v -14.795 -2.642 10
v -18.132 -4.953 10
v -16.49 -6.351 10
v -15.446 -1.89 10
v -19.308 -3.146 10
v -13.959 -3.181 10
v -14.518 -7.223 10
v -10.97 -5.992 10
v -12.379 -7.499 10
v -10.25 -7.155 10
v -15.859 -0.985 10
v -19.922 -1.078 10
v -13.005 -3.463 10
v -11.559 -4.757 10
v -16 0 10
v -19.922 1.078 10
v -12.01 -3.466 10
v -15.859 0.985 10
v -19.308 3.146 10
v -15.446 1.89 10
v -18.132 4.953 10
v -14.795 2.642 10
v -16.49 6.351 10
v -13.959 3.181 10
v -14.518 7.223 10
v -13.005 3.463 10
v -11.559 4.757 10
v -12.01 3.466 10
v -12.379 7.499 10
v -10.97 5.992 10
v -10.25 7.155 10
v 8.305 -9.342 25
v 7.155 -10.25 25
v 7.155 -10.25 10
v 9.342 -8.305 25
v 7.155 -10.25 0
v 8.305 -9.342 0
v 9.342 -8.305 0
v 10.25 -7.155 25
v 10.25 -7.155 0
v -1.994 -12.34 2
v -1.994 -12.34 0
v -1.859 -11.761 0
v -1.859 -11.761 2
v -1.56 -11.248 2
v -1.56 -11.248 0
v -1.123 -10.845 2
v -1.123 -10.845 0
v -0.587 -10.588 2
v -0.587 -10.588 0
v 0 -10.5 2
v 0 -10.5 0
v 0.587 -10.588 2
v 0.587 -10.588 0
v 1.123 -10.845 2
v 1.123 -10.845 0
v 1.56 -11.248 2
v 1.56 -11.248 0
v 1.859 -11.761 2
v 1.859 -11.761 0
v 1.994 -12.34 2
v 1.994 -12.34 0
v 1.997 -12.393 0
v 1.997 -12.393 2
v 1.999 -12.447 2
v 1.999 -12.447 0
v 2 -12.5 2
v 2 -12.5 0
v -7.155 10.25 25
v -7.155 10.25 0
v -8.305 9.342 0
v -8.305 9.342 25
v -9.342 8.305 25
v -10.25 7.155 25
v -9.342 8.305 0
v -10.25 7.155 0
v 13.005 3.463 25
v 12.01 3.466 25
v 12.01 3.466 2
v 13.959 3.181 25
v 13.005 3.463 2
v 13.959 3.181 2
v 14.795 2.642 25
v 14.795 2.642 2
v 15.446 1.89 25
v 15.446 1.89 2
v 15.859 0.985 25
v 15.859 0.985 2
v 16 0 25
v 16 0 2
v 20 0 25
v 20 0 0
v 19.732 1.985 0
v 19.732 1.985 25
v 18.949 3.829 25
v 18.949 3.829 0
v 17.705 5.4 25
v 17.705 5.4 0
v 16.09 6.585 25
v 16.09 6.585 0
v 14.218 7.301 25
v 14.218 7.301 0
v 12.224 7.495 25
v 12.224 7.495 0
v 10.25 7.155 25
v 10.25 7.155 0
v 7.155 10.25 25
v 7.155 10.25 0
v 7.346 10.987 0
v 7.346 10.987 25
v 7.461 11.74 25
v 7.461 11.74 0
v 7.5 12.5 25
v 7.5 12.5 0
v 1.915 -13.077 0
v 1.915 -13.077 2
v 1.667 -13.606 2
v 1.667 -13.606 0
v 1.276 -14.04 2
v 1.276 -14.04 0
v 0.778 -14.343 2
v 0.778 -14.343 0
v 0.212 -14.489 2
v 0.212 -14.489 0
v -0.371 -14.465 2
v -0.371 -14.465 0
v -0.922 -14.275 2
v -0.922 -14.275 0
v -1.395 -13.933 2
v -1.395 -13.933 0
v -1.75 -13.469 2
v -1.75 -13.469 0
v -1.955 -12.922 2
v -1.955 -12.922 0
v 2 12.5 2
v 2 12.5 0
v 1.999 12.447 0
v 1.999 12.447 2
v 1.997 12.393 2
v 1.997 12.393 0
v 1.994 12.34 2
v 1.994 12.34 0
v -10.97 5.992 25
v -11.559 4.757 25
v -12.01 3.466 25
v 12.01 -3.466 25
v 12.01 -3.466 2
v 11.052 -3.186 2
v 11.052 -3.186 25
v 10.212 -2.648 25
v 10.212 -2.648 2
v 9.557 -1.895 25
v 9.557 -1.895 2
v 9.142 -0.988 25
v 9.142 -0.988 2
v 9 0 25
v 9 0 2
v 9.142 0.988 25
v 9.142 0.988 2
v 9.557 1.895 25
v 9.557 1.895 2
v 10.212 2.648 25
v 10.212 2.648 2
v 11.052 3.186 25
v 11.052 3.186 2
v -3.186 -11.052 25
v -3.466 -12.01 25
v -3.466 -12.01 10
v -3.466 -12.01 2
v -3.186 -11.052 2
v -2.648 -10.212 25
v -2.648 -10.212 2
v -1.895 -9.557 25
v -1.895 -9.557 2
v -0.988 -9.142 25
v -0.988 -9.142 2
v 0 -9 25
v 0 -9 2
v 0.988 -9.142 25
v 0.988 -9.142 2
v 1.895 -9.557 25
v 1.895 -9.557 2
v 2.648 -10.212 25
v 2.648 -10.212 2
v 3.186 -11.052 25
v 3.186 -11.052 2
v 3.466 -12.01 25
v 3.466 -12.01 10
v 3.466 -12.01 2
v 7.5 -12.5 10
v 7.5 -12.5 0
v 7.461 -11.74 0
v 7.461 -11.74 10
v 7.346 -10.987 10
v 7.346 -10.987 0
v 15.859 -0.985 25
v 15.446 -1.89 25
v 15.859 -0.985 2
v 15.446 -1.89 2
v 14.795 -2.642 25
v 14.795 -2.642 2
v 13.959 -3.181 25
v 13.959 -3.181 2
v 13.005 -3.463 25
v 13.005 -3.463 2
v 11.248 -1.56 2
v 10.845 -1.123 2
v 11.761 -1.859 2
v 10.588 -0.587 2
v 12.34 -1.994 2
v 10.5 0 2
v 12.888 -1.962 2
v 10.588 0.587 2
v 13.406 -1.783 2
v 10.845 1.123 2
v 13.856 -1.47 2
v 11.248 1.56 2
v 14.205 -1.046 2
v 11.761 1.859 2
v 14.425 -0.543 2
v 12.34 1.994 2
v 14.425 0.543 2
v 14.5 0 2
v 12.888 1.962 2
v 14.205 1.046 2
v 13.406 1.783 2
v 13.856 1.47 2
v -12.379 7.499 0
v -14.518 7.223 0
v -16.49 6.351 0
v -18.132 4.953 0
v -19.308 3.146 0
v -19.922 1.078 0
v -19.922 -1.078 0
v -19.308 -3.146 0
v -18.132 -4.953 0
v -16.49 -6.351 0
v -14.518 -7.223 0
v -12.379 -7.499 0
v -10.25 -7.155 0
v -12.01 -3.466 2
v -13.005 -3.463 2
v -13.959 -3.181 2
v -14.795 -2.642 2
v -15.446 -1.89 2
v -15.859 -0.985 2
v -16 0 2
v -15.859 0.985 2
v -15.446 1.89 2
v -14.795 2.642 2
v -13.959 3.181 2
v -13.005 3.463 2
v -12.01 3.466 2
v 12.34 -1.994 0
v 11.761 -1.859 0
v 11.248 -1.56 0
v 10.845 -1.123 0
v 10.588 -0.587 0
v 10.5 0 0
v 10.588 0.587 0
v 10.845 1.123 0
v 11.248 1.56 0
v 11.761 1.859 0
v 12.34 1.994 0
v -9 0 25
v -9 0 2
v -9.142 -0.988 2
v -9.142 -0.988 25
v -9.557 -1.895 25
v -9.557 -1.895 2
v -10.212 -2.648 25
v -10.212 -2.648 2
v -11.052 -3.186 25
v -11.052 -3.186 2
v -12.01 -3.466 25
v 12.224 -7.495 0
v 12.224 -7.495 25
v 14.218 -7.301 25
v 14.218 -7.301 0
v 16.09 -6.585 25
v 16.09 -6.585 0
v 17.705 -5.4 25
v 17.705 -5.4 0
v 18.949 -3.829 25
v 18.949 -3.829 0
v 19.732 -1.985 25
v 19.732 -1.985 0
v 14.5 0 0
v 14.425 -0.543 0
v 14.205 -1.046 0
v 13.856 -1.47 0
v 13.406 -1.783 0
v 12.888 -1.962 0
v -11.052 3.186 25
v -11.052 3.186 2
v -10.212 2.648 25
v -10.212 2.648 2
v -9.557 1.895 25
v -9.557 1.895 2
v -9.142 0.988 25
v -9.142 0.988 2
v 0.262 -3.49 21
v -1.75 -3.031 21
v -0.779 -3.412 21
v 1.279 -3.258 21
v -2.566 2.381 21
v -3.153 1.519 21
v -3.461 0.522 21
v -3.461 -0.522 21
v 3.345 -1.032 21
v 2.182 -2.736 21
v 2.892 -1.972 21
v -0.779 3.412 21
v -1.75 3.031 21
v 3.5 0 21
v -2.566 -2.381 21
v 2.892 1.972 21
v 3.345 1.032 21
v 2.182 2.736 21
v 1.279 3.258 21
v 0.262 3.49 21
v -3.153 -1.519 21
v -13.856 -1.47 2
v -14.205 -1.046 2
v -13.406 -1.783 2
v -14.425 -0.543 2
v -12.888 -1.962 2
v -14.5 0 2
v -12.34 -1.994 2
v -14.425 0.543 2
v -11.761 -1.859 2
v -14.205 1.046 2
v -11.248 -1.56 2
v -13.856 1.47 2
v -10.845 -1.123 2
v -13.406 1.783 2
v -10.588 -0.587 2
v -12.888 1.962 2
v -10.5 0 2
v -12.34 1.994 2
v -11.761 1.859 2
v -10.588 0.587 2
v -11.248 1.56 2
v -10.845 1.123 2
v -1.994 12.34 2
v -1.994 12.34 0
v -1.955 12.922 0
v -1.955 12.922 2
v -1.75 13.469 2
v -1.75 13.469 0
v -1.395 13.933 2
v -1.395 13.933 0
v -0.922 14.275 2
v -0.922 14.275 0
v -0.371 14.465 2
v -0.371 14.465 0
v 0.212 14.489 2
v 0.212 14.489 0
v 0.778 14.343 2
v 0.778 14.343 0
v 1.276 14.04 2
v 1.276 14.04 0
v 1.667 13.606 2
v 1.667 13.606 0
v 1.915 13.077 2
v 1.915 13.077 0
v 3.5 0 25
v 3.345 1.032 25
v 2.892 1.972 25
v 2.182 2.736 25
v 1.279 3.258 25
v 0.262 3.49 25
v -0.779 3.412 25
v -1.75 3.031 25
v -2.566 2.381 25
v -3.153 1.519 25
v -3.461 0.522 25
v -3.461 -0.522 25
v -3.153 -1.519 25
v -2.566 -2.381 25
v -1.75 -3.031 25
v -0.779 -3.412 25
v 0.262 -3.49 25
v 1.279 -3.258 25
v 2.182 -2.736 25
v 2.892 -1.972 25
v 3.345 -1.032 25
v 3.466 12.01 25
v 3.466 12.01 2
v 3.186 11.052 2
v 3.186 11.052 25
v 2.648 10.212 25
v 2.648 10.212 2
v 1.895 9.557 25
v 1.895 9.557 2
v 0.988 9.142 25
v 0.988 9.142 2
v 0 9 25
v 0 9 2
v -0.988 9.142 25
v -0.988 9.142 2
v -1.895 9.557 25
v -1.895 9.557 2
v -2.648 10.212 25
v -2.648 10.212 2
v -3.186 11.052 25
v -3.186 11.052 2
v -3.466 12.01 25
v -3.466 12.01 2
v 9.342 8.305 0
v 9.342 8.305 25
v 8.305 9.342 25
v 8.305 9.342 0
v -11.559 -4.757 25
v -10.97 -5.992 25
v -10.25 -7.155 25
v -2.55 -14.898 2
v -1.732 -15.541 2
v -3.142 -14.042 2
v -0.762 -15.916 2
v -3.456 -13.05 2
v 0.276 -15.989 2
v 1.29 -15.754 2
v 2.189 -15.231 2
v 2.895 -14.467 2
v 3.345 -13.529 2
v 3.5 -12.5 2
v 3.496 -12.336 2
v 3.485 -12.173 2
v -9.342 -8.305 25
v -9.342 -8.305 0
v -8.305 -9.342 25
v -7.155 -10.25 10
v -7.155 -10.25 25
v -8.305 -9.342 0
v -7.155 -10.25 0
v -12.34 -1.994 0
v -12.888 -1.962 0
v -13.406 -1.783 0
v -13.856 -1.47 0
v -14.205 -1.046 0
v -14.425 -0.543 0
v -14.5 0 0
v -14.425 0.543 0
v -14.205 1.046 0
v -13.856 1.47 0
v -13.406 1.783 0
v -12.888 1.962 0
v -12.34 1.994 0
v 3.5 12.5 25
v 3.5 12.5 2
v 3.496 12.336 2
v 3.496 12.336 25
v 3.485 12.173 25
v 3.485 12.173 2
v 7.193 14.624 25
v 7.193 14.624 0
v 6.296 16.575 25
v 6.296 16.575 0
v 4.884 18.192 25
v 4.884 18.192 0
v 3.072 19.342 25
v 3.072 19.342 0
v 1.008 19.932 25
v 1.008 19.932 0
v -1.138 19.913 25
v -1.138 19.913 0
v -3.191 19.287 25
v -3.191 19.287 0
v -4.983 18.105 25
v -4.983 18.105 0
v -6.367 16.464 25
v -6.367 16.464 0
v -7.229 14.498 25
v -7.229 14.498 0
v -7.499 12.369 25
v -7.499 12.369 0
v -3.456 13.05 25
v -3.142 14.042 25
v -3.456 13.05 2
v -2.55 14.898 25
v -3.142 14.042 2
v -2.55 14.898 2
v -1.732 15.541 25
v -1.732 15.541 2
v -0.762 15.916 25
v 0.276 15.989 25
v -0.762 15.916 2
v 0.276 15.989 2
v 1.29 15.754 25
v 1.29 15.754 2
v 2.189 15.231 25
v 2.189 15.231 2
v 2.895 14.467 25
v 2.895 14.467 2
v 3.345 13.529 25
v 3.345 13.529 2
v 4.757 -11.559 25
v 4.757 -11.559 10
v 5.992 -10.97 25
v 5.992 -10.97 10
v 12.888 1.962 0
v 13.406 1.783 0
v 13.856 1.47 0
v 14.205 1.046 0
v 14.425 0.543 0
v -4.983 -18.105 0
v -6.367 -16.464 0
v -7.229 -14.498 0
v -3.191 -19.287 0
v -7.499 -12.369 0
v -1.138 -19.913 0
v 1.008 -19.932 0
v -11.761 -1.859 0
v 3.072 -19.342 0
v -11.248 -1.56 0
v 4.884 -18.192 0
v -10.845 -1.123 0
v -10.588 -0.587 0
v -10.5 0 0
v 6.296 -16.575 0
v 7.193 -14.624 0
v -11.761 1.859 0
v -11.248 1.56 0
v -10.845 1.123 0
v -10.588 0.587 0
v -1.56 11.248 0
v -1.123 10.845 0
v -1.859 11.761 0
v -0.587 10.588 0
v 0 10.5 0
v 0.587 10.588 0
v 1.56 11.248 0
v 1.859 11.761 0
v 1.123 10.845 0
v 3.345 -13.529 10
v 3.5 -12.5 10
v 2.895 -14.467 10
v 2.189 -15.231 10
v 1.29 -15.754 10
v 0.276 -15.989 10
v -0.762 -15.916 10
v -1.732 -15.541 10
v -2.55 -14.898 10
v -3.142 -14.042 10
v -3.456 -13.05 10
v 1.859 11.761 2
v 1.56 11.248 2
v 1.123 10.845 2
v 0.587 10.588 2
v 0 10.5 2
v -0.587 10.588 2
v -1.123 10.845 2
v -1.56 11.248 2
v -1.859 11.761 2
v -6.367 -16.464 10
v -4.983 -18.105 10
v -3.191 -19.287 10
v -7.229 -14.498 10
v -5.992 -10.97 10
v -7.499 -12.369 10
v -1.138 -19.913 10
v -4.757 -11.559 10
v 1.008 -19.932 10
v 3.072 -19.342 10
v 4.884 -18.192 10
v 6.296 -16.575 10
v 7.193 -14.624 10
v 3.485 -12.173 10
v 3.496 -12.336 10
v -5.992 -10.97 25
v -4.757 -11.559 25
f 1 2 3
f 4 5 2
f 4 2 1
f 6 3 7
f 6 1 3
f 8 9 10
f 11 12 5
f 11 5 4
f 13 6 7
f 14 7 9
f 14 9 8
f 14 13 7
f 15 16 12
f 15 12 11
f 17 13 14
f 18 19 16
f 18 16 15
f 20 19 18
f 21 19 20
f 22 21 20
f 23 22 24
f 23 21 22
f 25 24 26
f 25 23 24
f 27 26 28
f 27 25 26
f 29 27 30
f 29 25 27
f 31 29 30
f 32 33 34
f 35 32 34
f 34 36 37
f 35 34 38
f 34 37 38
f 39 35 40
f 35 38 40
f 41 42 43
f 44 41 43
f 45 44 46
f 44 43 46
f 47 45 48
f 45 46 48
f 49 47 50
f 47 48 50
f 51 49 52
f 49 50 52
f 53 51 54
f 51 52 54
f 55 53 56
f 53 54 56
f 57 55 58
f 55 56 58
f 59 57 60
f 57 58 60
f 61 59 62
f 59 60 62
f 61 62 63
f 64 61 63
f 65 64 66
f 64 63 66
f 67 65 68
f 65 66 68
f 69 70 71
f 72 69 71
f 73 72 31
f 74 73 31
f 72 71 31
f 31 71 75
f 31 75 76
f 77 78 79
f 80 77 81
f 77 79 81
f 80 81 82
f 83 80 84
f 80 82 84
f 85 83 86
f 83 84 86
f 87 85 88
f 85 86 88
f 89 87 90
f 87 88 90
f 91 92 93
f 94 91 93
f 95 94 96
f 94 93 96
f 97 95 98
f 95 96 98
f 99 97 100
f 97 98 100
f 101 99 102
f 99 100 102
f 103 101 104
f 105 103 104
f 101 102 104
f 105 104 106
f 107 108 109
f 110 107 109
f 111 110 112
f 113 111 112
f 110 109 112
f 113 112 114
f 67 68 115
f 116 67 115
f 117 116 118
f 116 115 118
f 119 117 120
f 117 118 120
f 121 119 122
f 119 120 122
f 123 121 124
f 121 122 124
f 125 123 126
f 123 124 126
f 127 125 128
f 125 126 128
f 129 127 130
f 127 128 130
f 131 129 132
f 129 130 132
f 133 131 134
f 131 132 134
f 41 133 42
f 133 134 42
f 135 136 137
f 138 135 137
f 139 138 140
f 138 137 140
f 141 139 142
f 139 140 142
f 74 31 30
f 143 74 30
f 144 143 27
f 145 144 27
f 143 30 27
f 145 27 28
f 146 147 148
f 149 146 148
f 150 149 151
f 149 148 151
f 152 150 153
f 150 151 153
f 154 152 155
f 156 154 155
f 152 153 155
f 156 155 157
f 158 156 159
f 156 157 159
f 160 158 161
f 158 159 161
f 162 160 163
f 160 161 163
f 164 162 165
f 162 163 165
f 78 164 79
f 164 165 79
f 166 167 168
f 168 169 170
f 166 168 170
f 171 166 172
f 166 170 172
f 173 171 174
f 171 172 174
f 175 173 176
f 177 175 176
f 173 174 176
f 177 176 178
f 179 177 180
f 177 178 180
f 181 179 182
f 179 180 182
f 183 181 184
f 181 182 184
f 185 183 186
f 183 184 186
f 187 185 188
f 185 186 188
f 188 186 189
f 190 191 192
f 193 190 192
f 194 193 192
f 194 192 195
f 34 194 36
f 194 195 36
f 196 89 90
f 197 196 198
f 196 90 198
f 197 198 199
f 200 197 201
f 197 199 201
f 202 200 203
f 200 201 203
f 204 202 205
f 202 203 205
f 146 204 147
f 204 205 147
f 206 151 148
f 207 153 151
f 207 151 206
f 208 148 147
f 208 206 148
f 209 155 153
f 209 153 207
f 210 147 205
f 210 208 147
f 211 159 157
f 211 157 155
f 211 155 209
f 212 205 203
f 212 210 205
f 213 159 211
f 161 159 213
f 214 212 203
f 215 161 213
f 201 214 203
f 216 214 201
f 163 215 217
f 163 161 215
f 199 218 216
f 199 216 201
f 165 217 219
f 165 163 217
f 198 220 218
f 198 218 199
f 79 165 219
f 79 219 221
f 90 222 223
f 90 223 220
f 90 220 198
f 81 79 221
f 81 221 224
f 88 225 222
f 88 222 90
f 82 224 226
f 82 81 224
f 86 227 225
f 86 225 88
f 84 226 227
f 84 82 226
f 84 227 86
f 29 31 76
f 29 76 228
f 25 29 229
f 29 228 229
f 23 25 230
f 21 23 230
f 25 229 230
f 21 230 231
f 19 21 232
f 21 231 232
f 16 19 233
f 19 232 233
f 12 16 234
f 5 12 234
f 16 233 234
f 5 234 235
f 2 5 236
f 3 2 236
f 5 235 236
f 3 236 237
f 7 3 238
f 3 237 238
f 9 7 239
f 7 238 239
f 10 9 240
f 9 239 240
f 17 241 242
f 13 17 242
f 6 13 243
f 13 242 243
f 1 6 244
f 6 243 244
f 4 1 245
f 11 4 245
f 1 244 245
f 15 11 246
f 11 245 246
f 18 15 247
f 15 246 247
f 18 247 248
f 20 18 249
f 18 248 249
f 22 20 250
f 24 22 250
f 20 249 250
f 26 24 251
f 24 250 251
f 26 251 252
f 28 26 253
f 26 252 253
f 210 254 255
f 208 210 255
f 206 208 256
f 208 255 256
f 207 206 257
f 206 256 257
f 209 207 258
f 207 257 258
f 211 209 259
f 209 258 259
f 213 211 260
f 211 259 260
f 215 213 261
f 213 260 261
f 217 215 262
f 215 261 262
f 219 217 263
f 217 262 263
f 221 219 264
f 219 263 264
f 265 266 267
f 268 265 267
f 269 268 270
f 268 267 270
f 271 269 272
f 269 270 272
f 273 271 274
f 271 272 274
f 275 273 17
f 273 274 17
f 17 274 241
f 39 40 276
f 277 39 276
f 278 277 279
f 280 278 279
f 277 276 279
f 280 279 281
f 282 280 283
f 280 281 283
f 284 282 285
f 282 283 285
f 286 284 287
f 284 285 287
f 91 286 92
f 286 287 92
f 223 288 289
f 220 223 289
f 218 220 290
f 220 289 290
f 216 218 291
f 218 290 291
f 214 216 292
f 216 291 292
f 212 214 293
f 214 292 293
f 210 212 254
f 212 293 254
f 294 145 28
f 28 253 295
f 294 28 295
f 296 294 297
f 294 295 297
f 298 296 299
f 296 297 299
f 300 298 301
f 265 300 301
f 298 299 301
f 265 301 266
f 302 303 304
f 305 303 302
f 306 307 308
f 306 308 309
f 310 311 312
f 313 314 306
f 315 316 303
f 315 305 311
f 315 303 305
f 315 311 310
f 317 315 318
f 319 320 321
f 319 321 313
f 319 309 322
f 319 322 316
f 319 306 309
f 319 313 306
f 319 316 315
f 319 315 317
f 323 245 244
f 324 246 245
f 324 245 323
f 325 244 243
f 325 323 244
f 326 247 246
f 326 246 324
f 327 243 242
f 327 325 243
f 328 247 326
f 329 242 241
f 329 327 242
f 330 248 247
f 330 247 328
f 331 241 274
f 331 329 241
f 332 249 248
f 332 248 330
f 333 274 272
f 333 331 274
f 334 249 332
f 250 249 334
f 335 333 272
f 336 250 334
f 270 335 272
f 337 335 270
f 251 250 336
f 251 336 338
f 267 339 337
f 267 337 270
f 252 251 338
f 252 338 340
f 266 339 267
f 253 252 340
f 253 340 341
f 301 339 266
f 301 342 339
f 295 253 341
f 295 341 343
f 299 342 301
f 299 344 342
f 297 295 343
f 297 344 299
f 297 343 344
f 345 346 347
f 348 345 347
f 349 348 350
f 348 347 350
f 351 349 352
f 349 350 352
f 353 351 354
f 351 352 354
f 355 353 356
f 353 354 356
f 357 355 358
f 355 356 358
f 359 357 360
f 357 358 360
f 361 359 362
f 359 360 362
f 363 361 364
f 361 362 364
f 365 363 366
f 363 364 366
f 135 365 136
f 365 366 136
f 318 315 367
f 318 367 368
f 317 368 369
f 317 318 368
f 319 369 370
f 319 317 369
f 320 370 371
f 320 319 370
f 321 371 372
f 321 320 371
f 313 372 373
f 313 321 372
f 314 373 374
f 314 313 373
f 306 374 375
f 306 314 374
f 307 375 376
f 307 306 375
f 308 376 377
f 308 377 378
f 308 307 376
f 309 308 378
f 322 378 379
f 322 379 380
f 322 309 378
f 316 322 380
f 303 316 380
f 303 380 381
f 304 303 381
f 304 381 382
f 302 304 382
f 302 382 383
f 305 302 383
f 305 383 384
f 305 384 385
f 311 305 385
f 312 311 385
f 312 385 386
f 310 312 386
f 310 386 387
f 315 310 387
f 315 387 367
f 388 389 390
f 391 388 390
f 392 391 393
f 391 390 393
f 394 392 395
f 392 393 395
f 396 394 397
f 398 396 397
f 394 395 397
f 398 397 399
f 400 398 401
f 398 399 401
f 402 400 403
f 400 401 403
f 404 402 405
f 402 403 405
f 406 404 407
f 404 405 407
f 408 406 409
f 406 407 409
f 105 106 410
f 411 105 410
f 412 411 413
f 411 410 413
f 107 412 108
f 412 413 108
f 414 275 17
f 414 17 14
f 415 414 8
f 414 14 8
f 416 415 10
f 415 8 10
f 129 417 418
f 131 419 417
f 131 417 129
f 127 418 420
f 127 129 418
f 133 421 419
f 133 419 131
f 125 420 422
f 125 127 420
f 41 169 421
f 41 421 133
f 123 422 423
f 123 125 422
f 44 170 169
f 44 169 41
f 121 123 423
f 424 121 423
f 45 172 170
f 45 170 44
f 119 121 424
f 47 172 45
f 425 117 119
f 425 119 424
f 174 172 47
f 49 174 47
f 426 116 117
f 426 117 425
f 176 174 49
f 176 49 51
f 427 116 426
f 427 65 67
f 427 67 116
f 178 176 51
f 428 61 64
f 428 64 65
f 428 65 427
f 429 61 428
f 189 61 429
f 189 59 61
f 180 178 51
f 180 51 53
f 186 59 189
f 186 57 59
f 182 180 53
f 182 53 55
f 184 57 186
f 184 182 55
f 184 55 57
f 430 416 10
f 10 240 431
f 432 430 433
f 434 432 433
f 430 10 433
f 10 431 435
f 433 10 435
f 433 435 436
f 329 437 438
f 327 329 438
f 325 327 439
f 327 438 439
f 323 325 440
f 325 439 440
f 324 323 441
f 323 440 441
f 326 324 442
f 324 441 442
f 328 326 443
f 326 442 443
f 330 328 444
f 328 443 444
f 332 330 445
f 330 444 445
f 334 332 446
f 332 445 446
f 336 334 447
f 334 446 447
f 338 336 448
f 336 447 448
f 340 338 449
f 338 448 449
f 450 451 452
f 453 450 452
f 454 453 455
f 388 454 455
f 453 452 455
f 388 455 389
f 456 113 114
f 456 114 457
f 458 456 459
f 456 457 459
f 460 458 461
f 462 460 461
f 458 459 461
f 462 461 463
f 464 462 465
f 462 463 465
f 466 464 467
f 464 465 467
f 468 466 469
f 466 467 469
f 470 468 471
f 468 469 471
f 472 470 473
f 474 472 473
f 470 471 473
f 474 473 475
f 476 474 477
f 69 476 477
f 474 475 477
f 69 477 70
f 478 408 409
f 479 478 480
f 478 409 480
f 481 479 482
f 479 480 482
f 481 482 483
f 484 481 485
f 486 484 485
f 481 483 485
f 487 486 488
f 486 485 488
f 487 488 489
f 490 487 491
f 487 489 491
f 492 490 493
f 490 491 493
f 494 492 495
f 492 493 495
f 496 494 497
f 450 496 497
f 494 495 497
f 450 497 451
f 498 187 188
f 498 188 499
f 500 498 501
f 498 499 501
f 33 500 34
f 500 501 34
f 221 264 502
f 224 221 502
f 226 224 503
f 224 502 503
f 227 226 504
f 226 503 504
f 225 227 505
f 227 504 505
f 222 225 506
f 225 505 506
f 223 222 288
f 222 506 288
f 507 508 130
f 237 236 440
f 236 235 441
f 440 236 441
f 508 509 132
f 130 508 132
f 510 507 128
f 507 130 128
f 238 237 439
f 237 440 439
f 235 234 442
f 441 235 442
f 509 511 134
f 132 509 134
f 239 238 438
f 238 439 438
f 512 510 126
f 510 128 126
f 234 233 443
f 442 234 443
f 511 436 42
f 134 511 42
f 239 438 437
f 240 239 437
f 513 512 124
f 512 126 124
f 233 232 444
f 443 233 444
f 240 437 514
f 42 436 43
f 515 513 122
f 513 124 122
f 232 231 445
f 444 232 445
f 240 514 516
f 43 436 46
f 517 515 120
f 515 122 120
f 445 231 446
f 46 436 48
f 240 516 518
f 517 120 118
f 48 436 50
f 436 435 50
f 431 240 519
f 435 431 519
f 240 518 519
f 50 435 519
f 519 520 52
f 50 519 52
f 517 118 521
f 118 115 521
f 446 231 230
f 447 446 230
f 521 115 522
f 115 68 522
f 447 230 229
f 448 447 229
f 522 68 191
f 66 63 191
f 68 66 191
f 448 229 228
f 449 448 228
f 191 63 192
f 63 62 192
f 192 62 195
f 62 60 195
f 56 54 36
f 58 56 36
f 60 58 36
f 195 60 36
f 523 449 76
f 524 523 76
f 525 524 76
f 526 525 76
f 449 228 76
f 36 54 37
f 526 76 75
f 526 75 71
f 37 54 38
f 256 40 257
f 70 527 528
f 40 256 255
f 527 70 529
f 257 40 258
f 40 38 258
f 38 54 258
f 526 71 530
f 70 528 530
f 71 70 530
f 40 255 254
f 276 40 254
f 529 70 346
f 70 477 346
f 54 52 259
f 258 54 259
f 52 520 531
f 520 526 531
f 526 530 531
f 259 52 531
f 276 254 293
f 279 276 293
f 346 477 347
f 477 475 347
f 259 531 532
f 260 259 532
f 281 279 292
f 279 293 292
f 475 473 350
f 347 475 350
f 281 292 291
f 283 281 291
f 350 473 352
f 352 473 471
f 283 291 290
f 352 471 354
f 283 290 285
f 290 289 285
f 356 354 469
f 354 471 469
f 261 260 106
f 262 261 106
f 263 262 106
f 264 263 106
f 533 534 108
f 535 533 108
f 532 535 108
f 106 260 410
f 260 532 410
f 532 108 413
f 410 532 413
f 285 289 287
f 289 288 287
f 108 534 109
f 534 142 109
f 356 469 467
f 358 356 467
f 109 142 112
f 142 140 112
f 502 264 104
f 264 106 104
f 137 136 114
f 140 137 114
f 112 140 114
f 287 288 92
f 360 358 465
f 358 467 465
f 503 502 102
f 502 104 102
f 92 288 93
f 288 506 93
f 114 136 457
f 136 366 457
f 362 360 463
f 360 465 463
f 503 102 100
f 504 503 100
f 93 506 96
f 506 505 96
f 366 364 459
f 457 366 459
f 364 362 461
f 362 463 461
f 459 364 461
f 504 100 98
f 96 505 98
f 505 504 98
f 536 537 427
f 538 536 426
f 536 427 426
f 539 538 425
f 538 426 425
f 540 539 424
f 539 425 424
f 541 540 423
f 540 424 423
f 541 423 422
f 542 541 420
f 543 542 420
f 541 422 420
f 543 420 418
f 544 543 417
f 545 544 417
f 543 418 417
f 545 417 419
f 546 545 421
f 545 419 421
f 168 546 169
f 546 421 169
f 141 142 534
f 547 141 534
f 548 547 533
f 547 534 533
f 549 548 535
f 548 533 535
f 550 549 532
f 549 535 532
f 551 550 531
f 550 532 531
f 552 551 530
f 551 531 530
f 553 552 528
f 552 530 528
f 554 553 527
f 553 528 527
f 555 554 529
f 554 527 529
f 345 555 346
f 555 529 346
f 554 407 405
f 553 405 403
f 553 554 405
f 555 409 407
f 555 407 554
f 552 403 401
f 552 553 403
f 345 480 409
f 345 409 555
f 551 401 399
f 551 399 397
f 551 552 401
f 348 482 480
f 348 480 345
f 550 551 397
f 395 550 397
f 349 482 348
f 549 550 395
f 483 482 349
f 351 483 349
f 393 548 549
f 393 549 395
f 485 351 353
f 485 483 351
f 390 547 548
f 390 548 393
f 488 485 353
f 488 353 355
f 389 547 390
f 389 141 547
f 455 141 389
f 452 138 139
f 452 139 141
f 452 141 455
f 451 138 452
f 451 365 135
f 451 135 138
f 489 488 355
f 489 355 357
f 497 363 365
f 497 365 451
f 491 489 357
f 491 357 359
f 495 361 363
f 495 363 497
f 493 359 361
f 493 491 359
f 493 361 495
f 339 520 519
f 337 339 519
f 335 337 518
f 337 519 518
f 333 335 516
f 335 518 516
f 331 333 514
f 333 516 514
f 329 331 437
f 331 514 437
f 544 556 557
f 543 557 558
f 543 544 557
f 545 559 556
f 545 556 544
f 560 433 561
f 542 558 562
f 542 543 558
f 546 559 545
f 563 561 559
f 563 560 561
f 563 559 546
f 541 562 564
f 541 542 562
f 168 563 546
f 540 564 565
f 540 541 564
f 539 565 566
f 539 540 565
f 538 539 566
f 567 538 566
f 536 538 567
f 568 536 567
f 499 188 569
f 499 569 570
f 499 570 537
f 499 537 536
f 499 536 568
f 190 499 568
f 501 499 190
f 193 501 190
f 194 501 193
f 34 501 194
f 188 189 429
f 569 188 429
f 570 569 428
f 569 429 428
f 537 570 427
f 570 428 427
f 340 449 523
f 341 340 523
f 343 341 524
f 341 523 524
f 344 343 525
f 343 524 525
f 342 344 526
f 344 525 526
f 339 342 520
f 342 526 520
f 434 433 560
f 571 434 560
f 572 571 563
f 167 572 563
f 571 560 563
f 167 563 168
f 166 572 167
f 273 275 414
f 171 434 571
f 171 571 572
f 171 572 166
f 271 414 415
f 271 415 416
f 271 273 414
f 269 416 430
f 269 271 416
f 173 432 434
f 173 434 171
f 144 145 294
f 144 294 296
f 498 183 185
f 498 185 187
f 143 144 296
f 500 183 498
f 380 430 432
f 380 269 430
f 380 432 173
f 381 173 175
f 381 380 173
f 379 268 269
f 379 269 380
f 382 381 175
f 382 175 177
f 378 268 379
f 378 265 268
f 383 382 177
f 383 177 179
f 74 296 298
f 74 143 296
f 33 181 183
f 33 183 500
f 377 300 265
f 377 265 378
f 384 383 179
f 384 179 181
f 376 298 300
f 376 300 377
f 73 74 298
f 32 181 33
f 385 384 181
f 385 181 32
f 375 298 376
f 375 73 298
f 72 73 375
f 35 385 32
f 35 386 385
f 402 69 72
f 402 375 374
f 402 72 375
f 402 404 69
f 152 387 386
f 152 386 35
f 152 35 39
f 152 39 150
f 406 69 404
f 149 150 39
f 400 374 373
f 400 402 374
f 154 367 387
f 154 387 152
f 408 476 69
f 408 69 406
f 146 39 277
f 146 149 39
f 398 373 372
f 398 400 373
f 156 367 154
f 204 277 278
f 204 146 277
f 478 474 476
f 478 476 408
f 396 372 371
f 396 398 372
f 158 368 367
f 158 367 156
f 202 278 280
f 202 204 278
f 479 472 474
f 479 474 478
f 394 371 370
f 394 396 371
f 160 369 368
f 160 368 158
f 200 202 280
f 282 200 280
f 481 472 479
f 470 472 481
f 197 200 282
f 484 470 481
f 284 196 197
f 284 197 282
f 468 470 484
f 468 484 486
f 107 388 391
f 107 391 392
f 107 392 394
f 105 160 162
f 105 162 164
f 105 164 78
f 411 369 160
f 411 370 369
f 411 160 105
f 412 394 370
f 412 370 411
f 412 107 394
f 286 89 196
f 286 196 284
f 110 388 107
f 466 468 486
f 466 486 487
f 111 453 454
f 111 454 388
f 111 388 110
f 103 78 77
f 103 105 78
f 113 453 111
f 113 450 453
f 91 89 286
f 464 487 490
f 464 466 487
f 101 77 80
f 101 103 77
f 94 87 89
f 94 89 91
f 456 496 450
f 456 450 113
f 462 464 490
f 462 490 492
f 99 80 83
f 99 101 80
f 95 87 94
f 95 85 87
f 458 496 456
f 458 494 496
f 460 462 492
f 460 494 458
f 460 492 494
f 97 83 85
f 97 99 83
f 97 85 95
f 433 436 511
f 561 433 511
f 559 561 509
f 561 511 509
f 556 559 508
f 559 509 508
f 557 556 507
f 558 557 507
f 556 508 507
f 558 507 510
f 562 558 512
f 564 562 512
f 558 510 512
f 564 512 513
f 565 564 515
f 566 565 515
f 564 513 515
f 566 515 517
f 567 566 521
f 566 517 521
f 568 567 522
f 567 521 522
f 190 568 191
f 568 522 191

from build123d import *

# Parameters (mm, degrees)
F0_R     = 3.5
F1_DEPTH = 25
F2_DEPTH = 2
F3_DEPTH = 10
F4_DEPTH = 21


with BuildPart() as f1:
    # F0 (on Top) → F1 (new body)
    with BuildSketch(Plane.XY):
        with BuildLine():
            ThreePointArc((10.25, -7.1545440106), (5, 0), (10.25, 7.1545440106))
            ThreePointArc((10.25, 7.1545440106), (8.8388347648, 8.8388347648), (7.1545440106, 10.25))
            ThreePointArc((7.1545440106, 10.25), (0, 5), (-7.1545440106, 10.25))
            ThreePointArc((-7.1545440106, 10.25), (-8.8388347648, 8.8388347648), (-10.25, 7.1545440106))
            ThreePointArc((-10.25, 7.1545440106), (-6.4533066888, 4.4370598373), (-5, 0))
            ThreePointArc((-5, 0), (-6.4533066888, -4.4370598373), (-10.25, -7.1545440106))
            ThreePointArc((-10.25, -7.1545440106), (-8.8388347648, -8.8388347648), (-7.1545440106, -10.25))
            ThreePointArc((-7.1545440106, -10.25), (0, -5), (7.1545440106, -10.25))
            ThreePointArc((7.1545440106, -10.25), (8.8388347648, -8.8388347648), (10.25, -7.1545440106))
        make_face()
        Circle(F0_R, mode=Mode.SUBTRACT)
        with BuildLine():
            ThreePointArc((-7.1545440106, 10.25), (0, 5), (7.1545440106, 10.25))
            ThreePointArc((7.1545440106, 10.25), (5.3824617408, 11.2818041823), (3.4655302625, 12.01))
            ThreePointArc((3.4655302625, 12.01), (0, 9), (-3.4655302625, 12.01))
            ThreePointArc((-3.4655302625, 12.01), (-5.3824617408, 11.2818041823), (-7.1545440106, 10.25))
        make_face()
        with BuildLine():
            ThreePointArc((-5, 0), (-6.4533066888, 4.4370598373), (-10.25, 7.1545440106))
            ThreePointArc((-10.25, 7.1545440106), (-11.2818041823, 5.3824617408), (-12.01, 3.4655302625))
            ThreePointArc((-12.01, 3.4655302625), (-9.8575579477, 2.2951034835), (-9, 0))
            ThreePointArc((-9, 0), (-9.8575579477, -2.2951034835), (-12.01, -3.4655302625))
            ThreePointArc((-12.01, -3.4655302625), (-11.2818041823, -5.3824617408), (-10.25, -7.1545440106))
            ThreePointArc((-10.25, -7.1545440106), (-6.4533066888, -4.4370598373), (-5, 0))
        make_face()
        with BuildLine():
            ThreePointArc((3.4655302625, -12.01), (5.3824617408, -11.2818041823), (7.1545440106, -10.25))
            ThreePointArc((7.1545440106, -10.25), (0, -5), (-7.1545440106, -10.25))
            ThreePointArc((-7.1545440106, -10.25), (-5.3824617408, -11.2818041823), (-3.4655302625, -12.01))
            ThreePointArc((-3.4655302625, -12.01), (0, -9), (3.4655302625, -12.01))
        make_face()
        with BuildLine():
            ThreePointArc((12.01, -3.4655302625), (9, 0), (12.01, 3.4655302625))
            ThreePointArc((12.01, 3.4655302625), (11.2818041823, 5.3824617408), (10.25, 7.1545440106))
            ThreePointArc((10.25, 7.1545440106), (5, 0), (10.25, -7.1545440106))
            ThreePointArc((10.25, -7.1545440106), (11.2818041823, -5.3824617408), (12.01, -3.4655302625))
        make_face()
        with BuildLine():
            ThreePointArc((10.25, 7.1545440106), (11.2818041823, 5.3824617408), (12.01, 3.4655302625))
            ThreePointArc((12.01, 3.4655302625), (14.7951034835, 2.6424420523), (16, 0))
            ThreePointArc((16, 0), (14.7951034835, -2.6424420523), (12.01, -3.4655302625))
            ThreePointArc((12.01, -3.4655302625), (11.2818041823, -5.3824617408), (10.25, -7.1545440106))
            ThreePointArc((10.25, -7.1545440106), (16.9370598373, -6.0466933112), (20, 0))
            ThreePointArc((20, 0), (16.9370598373, 6.0466933112), (10.25, 7.1545440106))
        make_face()
        with BuildLine():
            ThreePointArc((3.4655302625, 12.01), (5.3824617408, 11.2818041823), (7.1545440106, 10.25))
            ThreePointArc((7.1545440106, 10.25), (7.4131329436, 11.3618172554), (7.5, 12.5))
            ThreePointArc((7.5, 12.5), (-1.1381827446, 19.9131329436), (-7.1545440106, 10.25))
            ThreePointArc((-7.1545440106, 10.25), (-5.3824617408, 11.2818041823), (-3.4655302625, 12.01))
            ThreePointArc((-3.4655302625, 12.01), (-0.2456054574, 15.9913719308), (3.5, 12.5))
            ThreePointArc((3.5, 12.5), (3.4913719308, 12.2543945426), (3.4655302625, 12.01))
        make_face()
    extrude(amount=F1_DEPTH)

    # F0 (on Top) → F2 (join)
    with BuildSketch(Plane.XY):
        with BuildLine():
            ThreePointArc((3.5, -12.5), (3.4913719308, -12.2543945426), (3.4655302625, -12.01))
            ThreePointArc((3.4655302625, -12.01), (2.7345425148, -12.1972241611), (1.9935897271, -12.34))
            ThreePointArc((1.9935897271, -12.34), (1.9983967892, -12.4199358201), (2, -12.5))
            ThreePointArc((2, -12.5), (-0.0800641799, -14.4983967892), (-1.9935897271, -12.34))
            ThreePointArc((-1.9935897271, -12.34), (-2.7345425148, -12.1972241611), (-3.4655302625, -12.01))
            ThreePointArc((-3.4655302625, -12.01), (-0.2456054574, -15.9913719308), (3.5, -12.5))
        make_face()
        with BuildLine():
            ThreePointArc((1.9935897271, -12.34), (2.7345425148, -12.1972241611), (3.4655302625, -12.01))
            ThreePointArc((3.4655302625, -12.01), (0, -9), (-3.4655302625, -12.01))
            ThreePointArc((-3.4655302625, -12.01), (-2.7345425148, -12.1972241611), (-1.9935897271, -12.34))
            ThreePointArc((-1.9935897271, -12.34), (0, -10.5), (1.9935897271, -12.34))
        make_face()
        with BuildLine():
            ThreePointArc((-12.34, 1.9935897271), (-12.1972241611, 2.7345425148), (-12.01, 3.4655302625))
            ThreePointArc((-12.01, 3.4655302625), (-16, 0), (-12.01, -3.4655302625))
            ThreePointArc((-12.01, -3.4655302625), (-12.1972241611, -2.7345425148), (-12.34, -1.9935897271))
            ThreePointArc((-12.34, -1.9935897271), (-14.5, 0), (-12.34, 1.9935897271))
        make_face()
        with BuildLine():
            ThreePointArc((-9, 0), (-9.8575579477, 2.2951034835), (-12.01, 3.4655302625))
            ThreePointArc((-12.01, 3.4655302625), (-12.1972241611, 2.7345425148), (-12.34, 1.9935897271))
            ThreePointArc((-12.34, 1.9935897271), (-11.0303061543, 1.3564659966), (-10.5, 0))
            ThreePointArc((-10.5, 0), (-11.0303061543, -1.3564659966), (-12.34, -1.9935897271))
            ThreePointArc((-12.34, -1.9935897271), (-12.1972241611, -2.7345425148), (-12.01, -3.4655302625))
            ThreePointArc((-12.01, -3.4655302625), (-9.8575579477, -2.2951034835), (-9, 0))
        make_face()
        with BuildLine():
            ThreePointArc((1.9935897271, 12.34), (2.7345425148, 12.1972241611), (3.4655302625, 12.01))
            ThreePointArc((3.4655302625, 12.01), (3.4913719308, 12.2543945426), (3.5, 12.5))
            ThreePointArc((3.5, 12.5), (-0.2456054574, 15.9913719308), (-3.4655302625, 12.01))
            ThreePointArc((-3.4655302625, 12.01), (-2.7345425148, 12.1972241611), (-1.9935897271, 12.34))
            ThreePointArc((-1.9935897271, 12.34), (-0.0800641799, 14.4983967892), (2, 12.5))
            ThreePointArc((2, 12.5), (1.9983967892, 12.4199358201), (1.9935897271, 12.34))
        make_face()
        with BuildLine():
            ThreePointArc((-3.4655302625, 12.01), (0, 9), (3.4655302625, 12.01))
            ThreePointArc((3.4655302625, 12.01), (2.7345425148, 12.1972241611), (1.9935897271, 12.34))
            ThreePointArc((1.9935897271, 12.34), (0, 10.5), (-1.9935897271, 12.34))
            ThreePointArc((-1.9935897271, 12.34), (-2.7345425148, 12.1972241611), (-3.4655302625, 12.01))
        make_face()
        with BuildLine():
            ThreePointArc((12.01, 3.4655302625), (12.1972241611, 2.7345425148), (12.34, 1.9935897271))
            ThreePointArc((12.34, 1.9935897271), (13.8564659966, 1.4696938457), (14.5, 0))
            ThreePointArc((14.5, 0), (13.8564659966, -1.4696938457), (12.34, -1.9935897271))
            ThreePointArc((12.34, -1.9935897271), (12.1972241611, -2.7345425148), (12.01, -3.4655302625))
            ThreePointArc((12.01, -3.4655302625), (14.7951034835, -2.6424420523), (16, 0))
            ThreePointArc((16, 0), (14.7951034835, 2.6424420523), (12.01, 3.4655302625))
        make_face()
        with BuildLine():
            ThreePointArc((12.34, -1.9935897271), (10.5, 0), (12.34, 1.9935897271))
            ThreePointArc((12.34, 1.9935897271), (12.1972241611, 2.7345425148), (12.01, 3.4655302625))
            ThreePointArc((12.01, 3.4655302625), (9, 0), (12.01, -3.4655302625))
            ThreePointArc((12.01, -3.4655302625), (12.1972241611, -2.7345425148), (12.34, -1.9935897271))
        make_face()
    extrude(amount=F2_DEPTH)

    # F0 (on Top) → F3 (join)
    with BuildSketch(Plane.XY):
        with BuildLine():
            ThreePointArc((-12.01, 3.4655302625), (-11.2818041823, 5.3824617408), (-10.25, 7.1545440106))
            ThreePointArc((-10.25, 7.1545440106), (-20, 0), (-10.25, -7.1545440106))
            ThreePointArc((-10.25, -7.1545440106), (-11.2818041823, -5.3824617408), (-12.01, -3.4655302625))
            ThreePointArc((-12.01, -3.4655302625), (-16, 0), (-12.01, 3.4655302625))
        make_face()
        with BuildLine():
            ThreePointArc((7.5, -12.5), (7.4131329436, -11.3618172554), (7.1545440106, -10.25))
            ThreePointArc((7.1545440106, -10.25), (5.3824617408, -11.2818041823), (3.4655302625, -12.01))
            ThreePointArc((3.4655302625, -12.01), (3.4913719308, -12.2543945426), (3.5, -12.5))
            ThreePointArc((3.5, -12.5), (-0.2456054574, -15.9913719308), (-3.4655302625, -12.01))
            ThreePointArc((-3.4655302625, -12.01), (-5.3824617408, -11.2818041823), (-7.1545440106, -10.25))
            ThreePointArc((-7.1545440106, -10.25), (-1.1381827446, -19.9131329436), (7.5, -12.5))
        make_face()
    extrude(amount=F3_DEPTH)

    # F0 (on Top) → F4 (join)
    with BuildSketch(Plane.XY):
        Circle(F0_R)
    extrude(amount=F4_DEPTH)


solid = f1.part
